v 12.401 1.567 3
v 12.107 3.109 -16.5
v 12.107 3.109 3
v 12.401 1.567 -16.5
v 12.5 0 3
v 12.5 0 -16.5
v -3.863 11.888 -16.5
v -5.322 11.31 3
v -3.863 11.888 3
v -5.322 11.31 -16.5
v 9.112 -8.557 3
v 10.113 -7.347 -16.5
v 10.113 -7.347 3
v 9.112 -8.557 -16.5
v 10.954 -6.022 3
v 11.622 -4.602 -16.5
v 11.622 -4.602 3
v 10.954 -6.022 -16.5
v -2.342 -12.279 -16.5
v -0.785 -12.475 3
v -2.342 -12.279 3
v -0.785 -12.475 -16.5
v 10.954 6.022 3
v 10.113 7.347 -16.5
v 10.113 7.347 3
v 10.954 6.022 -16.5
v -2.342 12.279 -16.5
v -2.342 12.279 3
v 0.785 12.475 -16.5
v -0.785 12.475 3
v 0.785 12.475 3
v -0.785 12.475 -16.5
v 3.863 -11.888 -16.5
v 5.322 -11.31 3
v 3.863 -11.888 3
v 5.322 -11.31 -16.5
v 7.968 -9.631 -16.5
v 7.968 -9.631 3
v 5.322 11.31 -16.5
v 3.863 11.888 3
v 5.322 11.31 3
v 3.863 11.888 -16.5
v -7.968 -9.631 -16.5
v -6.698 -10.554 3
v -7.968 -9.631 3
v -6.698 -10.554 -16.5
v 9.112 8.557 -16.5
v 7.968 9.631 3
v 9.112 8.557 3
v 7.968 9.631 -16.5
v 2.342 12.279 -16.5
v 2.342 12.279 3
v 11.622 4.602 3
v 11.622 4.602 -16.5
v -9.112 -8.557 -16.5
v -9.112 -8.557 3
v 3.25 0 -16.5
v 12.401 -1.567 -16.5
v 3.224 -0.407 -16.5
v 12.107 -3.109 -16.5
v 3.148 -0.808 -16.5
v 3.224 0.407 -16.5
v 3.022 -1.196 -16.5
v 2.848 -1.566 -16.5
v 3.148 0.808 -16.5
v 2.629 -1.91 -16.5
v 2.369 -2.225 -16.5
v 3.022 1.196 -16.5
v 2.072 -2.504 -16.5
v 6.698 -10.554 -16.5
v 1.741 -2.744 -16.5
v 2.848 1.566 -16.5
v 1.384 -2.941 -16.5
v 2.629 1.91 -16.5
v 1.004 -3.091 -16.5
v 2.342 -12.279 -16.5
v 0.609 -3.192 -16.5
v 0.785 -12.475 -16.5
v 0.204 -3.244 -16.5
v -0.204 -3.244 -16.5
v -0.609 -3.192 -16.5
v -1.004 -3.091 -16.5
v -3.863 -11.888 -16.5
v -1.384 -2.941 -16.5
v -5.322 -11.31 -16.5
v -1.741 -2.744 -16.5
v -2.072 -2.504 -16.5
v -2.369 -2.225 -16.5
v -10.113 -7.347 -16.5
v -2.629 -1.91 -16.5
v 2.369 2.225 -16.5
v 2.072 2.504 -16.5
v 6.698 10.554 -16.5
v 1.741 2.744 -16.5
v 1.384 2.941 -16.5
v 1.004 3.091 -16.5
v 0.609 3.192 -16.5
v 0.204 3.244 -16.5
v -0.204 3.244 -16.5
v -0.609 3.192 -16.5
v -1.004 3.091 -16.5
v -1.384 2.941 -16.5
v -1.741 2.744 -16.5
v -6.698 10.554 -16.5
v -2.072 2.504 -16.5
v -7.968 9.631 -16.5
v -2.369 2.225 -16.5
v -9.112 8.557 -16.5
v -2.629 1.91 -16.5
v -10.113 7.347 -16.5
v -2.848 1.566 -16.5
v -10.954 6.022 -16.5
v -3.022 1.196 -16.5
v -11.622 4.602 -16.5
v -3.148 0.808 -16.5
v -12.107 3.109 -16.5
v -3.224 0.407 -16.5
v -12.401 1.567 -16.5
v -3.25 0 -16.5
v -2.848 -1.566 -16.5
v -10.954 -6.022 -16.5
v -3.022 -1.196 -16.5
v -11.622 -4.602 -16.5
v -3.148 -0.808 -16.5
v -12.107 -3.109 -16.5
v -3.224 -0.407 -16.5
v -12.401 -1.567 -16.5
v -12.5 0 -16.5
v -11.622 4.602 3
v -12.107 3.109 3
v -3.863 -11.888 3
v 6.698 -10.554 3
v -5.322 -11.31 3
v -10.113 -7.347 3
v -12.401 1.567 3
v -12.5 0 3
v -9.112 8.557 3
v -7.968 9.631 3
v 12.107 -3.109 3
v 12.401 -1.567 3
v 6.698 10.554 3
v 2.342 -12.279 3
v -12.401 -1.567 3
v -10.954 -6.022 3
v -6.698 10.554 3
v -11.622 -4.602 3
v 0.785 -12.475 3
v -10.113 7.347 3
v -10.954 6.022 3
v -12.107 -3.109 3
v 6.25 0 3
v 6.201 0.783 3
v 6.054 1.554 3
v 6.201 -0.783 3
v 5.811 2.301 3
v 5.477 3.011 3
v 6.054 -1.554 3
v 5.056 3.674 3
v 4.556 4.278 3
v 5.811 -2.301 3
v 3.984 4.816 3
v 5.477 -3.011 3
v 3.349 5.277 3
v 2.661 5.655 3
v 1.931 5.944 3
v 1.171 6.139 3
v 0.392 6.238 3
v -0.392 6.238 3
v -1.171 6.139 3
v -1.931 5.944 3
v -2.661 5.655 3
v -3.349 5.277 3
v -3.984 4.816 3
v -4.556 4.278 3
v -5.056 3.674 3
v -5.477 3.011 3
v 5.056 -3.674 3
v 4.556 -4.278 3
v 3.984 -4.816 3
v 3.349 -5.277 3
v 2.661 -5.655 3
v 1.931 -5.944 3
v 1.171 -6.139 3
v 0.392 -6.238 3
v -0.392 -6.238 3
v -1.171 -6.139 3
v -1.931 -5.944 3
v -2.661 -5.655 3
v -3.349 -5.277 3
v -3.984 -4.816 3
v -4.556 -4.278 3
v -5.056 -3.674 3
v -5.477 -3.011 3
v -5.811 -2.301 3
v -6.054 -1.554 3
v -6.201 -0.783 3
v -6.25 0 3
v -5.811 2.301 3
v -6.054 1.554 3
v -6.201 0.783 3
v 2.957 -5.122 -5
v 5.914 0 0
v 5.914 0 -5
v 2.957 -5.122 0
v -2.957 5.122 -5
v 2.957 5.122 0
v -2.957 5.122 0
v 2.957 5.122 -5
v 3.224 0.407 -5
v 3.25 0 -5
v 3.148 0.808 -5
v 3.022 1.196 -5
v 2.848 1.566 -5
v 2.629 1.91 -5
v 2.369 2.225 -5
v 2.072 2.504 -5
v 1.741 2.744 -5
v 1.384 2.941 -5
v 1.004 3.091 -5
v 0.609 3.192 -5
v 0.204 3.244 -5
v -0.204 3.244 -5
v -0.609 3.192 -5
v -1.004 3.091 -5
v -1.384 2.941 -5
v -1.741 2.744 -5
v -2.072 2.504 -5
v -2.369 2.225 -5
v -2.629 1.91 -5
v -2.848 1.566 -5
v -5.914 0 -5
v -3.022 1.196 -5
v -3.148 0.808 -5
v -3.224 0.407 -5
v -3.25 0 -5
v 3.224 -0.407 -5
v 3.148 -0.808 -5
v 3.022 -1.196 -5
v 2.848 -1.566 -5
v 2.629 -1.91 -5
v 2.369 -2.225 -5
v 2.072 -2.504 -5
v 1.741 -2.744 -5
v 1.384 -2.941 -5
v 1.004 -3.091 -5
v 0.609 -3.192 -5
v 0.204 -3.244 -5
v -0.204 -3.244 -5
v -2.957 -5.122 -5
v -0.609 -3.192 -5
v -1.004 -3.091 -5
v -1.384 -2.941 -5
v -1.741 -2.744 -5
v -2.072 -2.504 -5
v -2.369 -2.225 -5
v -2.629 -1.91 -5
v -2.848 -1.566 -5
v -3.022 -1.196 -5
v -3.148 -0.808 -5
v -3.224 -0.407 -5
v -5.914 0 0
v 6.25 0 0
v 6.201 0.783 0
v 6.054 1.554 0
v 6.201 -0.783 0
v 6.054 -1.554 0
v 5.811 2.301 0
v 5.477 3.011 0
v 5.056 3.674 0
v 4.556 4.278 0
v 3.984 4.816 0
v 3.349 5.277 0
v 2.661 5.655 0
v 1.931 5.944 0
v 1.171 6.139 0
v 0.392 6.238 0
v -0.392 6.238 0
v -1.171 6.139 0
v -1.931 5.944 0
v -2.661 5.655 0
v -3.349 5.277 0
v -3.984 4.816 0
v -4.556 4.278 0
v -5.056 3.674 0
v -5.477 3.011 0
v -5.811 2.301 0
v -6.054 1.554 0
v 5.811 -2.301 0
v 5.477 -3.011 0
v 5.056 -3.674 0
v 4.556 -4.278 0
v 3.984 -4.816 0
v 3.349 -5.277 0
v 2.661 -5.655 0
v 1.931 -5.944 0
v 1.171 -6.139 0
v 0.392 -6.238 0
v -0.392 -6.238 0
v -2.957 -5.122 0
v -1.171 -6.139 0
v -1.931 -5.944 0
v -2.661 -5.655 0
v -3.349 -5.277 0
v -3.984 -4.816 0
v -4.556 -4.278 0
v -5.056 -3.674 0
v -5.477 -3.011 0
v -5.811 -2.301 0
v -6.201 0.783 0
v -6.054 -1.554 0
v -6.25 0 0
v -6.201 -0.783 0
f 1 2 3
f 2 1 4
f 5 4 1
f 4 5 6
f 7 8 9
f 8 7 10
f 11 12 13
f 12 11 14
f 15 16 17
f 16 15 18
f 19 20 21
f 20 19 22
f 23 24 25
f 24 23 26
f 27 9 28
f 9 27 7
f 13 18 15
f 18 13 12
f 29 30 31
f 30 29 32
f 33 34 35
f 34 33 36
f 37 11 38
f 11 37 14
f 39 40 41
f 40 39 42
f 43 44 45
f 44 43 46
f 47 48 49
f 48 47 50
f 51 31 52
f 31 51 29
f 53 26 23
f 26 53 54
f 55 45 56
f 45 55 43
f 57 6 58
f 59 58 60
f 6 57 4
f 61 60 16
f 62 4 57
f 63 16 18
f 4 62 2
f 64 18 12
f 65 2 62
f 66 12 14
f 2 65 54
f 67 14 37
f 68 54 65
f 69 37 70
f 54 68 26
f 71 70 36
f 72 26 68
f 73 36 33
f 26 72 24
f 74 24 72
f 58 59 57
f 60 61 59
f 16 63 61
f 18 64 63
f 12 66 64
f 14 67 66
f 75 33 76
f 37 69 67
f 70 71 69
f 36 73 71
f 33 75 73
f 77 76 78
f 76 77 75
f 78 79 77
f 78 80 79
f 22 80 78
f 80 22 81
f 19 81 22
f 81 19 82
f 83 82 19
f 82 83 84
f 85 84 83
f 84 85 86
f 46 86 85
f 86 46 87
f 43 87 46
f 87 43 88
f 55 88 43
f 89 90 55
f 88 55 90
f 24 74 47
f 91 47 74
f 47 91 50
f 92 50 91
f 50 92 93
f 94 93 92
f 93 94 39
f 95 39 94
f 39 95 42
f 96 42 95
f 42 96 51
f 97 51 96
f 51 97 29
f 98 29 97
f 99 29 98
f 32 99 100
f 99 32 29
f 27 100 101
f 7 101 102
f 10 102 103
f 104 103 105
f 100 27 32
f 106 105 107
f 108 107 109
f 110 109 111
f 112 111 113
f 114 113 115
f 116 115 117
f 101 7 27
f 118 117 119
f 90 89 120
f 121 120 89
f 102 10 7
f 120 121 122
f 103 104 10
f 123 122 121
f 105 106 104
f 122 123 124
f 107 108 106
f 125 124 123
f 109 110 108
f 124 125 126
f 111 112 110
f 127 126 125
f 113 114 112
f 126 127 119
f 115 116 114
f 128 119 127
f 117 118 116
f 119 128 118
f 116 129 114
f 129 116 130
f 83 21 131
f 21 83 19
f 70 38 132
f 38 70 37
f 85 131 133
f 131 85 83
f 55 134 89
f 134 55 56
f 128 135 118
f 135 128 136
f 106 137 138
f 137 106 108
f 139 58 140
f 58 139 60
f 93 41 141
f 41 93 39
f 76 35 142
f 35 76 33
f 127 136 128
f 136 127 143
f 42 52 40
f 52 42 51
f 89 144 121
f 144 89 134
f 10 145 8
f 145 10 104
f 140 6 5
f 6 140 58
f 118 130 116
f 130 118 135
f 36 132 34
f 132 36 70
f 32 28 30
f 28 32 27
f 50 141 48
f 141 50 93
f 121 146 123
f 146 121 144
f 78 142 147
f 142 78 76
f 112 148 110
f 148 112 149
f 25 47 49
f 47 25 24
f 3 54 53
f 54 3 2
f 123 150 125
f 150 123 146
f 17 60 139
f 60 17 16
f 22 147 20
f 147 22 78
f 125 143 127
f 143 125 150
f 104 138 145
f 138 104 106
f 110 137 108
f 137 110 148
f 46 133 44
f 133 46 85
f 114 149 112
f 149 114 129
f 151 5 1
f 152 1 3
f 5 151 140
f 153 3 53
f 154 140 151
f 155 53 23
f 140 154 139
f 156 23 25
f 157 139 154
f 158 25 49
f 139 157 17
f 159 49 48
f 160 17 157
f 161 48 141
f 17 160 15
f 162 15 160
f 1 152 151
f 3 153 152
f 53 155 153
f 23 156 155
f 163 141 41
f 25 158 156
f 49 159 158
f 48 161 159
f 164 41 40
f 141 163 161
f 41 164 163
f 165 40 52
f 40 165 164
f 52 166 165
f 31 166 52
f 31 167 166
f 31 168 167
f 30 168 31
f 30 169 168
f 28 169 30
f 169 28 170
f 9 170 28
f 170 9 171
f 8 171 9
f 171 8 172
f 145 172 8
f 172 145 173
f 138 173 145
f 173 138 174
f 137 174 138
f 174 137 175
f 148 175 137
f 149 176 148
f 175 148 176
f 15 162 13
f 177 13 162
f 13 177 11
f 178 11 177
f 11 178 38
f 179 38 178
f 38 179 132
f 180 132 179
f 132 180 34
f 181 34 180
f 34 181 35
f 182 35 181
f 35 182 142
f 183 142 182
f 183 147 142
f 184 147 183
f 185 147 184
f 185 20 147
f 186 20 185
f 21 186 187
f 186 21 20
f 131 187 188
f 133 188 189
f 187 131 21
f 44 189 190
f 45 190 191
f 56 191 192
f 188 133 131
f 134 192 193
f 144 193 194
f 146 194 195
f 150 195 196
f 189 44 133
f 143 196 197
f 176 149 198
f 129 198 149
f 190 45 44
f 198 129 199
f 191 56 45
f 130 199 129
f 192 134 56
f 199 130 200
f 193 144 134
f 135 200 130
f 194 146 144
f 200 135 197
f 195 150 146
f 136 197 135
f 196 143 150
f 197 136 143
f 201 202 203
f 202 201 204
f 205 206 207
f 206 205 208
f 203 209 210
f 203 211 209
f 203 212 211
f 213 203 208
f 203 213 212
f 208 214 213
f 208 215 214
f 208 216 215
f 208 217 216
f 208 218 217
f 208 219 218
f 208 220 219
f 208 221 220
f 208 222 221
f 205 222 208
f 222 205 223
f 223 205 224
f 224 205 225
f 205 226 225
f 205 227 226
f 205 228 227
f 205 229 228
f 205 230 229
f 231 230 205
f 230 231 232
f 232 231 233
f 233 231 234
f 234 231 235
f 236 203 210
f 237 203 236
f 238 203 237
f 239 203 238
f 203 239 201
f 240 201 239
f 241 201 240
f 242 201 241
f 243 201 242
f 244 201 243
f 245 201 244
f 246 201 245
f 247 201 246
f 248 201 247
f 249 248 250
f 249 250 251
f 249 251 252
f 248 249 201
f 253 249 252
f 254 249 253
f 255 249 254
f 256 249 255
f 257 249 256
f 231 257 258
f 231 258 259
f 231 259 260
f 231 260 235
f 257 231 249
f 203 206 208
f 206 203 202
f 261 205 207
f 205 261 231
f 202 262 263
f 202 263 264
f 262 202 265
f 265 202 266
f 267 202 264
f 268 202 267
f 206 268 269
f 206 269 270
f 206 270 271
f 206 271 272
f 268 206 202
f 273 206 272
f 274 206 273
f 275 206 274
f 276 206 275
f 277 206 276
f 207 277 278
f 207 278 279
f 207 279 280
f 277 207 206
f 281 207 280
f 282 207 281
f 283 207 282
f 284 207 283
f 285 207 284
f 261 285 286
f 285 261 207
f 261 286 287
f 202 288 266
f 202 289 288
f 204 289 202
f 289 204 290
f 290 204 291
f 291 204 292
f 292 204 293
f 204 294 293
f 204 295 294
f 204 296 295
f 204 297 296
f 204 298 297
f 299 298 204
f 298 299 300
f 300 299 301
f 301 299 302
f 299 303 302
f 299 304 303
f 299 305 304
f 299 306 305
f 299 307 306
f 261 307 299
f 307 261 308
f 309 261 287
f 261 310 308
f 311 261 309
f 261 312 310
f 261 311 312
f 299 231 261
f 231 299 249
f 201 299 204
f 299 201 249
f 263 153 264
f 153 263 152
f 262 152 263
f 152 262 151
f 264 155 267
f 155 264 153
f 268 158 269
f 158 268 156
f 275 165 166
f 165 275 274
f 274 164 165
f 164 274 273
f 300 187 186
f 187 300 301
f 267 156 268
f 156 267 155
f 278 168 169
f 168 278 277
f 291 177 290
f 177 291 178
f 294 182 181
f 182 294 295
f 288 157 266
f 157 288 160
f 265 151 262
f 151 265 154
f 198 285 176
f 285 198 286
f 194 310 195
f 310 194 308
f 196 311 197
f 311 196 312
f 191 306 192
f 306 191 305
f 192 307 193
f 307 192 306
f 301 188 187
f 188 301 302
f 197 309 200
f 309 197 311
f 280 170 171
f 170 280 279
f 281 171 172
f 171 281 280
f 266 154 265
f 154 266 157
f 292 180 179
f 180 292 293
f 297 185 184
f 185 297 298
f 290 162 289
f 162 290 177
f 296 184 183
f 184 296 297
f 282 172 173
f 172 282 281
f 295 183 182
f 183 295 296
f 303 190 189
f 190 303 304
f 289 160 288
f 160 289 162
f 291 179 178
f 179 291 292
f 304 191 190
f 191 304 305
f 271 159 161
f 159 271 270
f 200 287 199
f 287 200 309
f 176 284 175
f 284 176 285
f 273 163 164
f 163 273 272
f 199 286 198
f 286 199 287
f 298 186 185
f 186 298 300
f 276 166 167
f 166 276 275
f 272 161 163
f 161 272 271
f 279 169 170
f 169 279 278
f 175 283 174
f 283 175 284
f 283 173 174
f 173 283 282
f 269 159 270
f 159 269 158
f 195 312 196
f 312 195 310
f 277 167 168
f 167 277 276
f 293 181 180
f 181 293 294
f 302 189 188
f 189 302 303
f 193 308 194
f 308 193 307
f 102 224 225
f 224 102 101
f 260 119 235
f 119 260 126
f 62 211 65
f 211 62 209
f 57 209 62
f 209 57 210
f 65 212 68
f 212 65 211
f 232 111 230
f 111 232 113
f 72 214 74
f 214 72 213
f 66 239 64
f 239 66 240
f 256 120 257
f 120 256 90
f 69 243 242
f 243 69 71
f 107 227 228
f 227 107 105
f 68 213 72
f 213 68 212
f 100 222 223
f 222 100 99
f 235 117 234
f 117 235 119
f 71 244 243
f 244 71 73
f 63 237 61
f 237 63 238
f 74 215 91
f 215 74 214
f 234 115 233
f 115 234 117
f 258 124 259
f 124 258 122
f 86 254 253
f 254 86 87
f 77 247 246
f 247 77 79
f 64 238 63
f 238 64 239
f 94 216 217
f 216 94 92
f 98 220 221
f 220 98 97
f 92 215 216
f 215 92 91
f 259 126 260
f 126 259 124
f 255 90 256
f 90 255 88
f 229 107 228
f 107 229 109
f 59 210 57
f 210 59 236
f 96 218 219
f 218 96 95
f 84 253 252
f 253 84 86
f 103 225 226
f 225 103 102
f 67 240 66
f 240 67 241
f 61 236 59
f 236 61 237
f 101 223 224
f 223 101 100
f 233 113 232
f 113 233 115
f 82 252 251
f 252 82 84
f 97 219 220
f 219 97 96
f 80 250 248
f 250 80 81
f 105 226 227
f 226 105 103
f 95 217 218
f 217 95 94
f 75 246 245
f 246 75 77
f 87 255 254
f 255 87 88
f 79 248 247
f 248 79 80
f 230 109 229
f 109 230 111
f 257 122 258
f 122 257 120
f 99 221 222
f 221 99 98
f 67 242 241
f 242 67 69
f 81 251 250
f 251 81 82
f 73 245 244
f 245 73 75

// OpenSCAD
$fn = 50;


difference() {
	union() {
		translate(v = [0, 0, -16.5000000000]) {
			cylinder(h = 19.5000000000, r = 12.5000000000);
		}
		#translate(v = [0, 0, -18.0000000000]) {
			cylinder(h = 18, r = 2.8750000000);
		}
	}
	union() {
		translate(v = [0, 0, 0]) {
			rotate(a = [0, 0, 0]) {
				difference() {
					union() {
						translate(v = [0, 0, -5]) {
							linear_extrude(height = 5) {
								polygon(points = [[5.9142500000, 0.0000000000], [2.9571250000, 5.1218907443], [-2.9571250000, 5.1218907443], [-5.9142500000, 0.0000000000], [-2.9571250000, -5.1218907443], [2.9571250000, -5.1218907443]]);
							}
						}
					}
					union();
				}
			}
		}
		#cylinder(h = 3, r = 6.2500000000);
		#translate(v = [0, 0, -100.0000000000]) {
			cylinder(h = 200, r = 3.2500000000);
		}
	}
}
